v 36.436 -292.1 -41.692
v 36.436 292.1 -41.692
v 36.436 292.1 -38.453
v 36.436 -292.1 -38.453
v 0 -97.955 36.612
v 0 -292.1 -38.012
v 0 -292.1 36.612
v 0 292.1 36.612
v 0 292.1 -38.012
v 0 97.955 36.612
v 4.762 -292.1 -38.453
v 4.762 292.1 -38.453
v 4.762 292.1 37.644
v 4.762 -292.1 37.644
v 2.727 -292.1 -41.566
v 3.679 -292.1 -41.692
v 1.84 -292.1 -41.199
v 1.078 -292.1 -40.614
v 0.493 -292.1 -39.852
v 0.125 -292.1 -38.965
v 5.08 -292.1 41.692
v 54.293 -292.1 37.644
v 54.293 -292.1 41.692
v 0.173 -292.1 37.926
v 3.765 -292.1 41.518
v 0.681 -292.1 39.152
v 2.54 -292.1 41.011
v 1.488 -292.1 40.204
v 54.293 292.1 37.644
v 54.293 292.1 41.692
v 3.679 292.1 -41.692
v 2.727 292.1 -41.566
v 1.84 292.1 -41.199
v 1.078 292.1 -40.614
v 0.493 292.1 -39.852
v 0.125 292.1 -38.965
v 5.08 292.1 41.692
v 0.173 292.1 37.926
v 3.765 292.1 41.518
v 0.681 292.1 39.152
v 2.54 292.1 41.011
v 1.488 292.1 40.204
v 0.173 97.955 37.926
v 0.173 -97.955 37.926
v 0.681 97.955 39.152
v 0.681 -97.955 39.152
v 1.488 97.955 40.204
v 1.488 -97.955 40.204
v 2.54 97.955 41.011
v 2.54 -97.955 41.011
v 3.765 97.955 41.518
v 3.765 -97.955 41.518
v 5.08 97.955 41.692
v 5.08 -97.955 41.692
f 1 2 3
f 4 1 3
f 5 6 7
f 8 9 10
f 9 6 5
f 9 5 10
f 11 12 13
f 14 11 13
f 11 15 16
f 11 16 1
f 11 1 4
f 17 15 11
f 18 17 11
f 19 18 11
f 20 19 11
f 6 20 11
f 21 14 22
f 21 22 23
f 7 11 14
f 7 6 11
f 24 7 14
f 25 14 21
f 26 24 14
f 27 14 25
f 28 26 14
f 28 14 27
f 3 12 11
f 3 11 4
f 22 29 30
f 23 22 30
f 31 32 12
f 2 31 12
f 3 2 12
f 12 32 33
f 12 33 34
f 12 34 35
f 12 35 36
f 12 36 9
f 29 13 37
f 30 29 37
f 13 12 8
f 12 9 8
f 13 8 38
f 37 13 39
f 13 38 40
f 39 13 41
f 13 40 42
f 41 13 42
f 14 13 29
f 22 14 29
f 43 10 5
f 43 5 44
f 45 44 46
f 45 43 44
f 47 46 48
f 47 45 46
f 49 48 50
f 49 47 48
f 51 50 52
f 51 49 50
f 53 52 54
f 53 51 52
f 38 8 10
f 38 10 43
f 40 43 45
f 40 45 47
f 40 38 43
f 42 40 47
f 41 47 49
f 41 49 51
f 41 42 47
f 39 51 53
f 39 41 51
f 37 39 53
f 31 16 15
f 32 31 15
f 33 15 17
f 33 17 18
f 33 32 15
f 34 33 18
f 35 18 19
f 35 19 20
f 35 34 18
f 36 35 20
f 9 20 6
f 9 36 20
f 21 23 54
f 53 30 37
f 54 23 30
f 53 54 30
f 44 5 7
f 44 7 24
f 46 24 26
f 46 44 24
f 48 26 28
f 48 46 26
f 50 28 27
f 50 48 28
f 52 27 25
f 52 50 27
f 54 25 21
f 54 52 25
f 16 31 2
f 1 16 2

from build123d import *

# Parameters (mm, degrees)
F0_W      = 195.9098130465
F0_H      = 83.3830982447
F1_DEPTH  = 4.7625
F2_W      = 195.9098130465
F2_H      = 3.2381750643
F3_DEPTH  = 34.8488
F4_R      = 3.6792614691
F5_DEPTH  = 3.175
F6_W      = 195.9098130465
F6_H      = 4.0477178991
F7_DEPTH  = 49.53
F8_R      = 5.08
F9_DEPTH  = 317.5
F10_DEPTH = 317.5
F11_DEPTH = 123.3551
F12_DEPTH = 123.3551


with BuildPart() as f1:
    # F0 (on Right) → F1 (new body)
    with BuildSketch(Plane.YZ):
        Rectangle(F0_W, F0_H)
    extrude(amount=F1_DEPTH)

    # F2 (on face) → F3 (join)
    with BuildSketch(Plane.YZ.offset(4.7625)):
        with Locations((0, -40.0724615902)):
            Rectangle(F2_W, F2_H)
    extrude(amount=F3_DEPTH)

    # F4
    f4_edges = [f1.edges().sort_by_distance(p)[0] for p in [
        (0, 0, -41.691549),
    ]]
    fillet(f4_edges, radius=F4_R)

    # F5 (cut): a face of the model
    f5_faces = [f1.faces().sort_by_distance(p)[0] for p in [
        (39.6113, 0, -40.0724615902),
    ]]
    extrude(f5_faces, amount=-F5_DEPTH, mode=Mode.SUBTRACT)

    # F6 (on face) → F7 (join)
    with BuildSketch(Plane.YZ.offset(4.7625)):
        with Locations((0, 39.6676901728)):
            Rectangle(F6_W, F6_H)
    extrude(amount=F7_DEPTH)

    # F8
    f8_edges = [f1.edges().sort_by_distance(p)[0] for p in [
        (0, 0, 41.691549),
    ]]
    fillet(f8_edges, radius=F8_R)

    # F9 (add): a face of the model
    f9_faces = [f1.faces().sort_by_distance(p)[0] for p in [
        (29.68625, 97.9549065232, 40.696540749),
    ]]
    extrude(f9_faces, amount=F9_DEPTH)

    # F10 (add): a face of the model
    f10_faces = [f1.faces().sort_by_distance(p)[0] for p in [
        (0.9950083733, -97.9549065232, -0.7003692655),
    ]]
    extrude(f10_faces, amount=F10_DEPTH)

    # F11 (cut): a face of the model
    f11_faces = [f1.faces().sort_by_distance(p)[0] for p in [
        (29.68625, 415.4549065232, 40.696540749),
    ]]
    extrude(f11_faces, amount=-F11_DEPTH, mode=Mode.SUBTRACT)

    # F12 (cut): a face of the model
    f12_faces = [f1.faces().sort_by_distance(p)[0] for p in [
        (0.9950083733, -415.4549065232, -0.7003692655),
    ]]
    extrude(f12_faces, amount=-F12_DEPTH, mode=Mode.SUBTRACT)


solid = f1.part
